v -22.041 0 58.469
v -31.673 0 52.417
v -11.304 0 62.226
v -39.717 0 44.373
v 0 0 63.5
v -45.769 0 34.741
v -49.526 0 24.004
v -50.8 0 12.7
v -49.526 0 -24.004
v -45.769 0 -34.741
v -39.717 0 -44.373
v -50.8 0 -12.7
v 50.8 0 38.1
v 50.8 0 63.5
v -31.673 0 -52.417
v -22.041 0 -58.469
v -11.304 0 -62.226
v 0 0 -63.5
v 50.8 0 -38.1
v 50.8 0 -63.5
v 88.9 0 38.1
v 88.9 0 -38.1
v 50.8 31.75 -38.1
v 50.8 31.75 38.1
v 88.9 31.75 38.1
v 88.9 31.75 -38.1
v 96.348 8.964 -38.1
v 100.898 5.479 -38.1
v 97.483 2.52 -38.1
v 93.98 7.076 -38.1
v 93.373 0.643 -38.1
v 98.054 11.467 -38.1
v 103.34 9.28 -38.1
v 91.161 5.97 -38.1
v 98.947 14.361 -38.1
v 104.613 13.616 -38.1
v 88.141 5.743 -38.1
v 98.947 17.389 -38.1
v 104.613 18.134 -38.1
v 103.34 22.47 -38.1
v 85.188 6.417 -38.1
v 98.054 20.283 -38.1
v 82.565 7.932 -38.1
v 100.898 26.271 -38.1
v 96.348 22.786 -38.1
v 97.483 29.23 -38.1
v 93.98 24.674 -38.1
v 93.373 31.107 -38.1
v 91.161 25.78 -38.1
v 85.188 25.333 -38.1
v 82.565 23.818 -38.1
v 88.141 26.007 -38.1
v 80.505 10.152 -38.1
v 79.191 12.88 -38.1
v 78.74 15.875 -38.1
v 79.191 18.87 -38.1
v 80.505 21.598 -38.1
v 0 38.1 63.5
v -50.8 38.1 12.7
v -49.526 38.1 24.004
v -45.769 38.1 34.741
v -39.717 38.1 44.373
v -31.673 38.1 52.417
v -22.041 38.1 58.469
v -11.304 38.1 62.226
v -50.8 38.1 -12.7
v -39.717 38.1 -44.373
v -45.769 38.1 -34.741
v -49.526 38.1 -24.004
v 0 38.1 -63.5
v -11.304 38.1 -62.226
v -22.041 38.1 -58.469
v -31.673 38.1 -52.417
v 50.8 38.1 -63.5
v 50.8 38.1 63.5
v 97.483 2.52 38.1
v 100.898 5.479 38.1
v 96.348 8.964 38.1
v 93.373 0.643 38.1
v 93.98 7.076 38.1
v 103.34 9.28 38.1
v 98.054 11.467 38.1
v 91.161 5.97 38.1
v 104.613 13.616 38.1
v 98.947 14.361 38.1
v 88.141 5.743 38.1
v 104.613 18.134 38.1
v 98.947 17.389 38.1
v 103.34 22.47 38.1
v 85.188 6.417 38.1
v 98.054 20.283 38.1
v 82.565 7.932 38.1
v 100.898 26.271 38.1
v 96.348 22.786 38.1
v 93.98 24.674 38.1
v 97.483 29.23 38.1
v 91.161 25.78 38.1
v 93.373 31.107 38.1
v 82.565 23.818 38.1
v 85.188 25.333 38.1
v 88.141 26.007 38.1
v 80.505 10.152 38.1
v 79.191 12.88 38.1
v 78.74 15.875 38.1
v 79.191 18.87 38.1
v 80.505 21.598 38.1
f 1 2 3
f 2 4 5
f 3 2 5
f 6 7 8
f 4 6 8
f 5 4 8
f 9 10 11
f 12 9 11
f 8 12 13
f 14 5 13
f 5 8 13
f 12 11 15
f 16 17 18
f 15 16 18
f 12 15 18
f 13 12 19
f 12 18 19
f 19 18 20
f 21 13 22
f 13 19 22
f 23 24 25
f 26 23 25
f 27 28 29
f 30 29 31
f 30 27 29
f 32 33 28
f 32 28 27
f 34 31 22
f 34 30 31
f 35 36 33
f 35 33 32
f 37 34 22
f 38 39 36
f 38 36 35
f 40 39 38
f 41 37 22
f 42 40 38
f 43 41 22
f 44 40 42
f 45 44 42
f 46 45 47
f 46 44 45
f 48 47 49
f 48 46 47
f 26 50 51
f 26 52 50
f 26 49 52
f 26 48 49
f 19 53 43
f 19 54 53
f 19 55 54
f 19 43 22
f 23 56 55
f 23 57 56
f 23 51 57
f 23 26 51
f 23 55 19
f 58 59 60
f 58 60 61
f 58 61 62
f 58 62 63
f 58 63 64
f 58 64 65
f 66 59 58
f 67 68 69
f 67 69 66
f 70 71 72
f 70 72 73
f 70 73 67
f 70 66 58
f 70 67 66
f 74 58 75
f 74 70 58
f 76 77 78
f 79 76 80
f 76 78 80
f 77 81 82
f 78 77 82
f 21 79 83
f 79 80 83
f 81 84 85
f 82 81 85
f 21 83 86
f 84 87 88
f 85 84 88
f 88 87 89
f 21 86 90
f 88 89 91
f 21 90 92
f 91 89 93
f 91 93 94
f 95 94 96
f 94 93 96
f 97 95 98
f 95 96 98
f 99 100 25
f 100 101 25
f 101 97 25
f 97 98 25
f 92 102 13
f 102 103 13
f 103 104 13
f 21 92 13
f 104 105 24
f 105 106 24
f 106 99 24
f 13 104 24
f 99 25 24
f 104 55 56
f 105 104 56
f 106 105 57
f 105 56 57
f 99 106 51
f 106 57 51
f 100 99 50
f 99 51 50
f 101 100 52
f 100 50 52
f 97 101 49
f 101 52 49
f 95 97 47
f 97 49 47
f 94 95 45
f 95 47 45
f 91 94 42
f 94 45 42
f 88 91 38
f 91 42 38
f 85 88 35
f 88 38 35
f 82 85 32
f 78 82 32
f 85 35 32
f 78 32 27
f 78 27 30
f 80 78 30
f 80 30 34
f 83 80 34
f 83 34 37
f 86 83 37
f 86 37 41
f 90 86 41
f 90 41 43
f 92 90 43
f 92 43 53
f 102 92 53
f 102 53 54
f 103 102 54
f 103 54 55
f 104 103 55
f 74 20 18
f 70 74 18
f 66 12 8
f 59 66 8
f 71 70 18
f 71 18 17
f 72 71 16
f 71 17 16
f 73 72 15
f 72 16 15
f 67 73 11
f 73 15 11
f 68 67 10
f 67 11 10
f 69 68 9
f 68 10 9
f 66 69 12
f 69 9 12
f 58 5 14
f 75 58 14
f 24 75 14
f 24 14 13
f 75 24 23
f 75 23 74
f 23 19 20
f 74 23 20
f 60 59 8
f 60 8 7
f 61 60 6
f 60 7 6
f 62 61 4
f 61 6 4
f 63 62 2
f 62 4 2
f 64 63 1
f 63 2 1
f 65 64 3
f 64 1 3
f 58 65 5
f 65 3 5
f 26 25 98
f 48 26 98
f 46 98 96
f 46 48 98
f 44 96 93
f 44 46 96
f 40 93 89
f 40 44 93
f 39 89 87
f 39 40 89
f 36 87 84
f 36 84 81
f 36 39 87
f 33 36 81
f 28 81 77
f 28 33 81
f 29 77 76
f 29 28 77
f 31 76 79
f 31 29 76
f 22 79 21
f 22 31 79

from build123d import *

# Parameters (mm, degrees)
BOSS_EXTRUDE1_DEPTH      = 38.1
BOSS_EXTRUDE2_DEPTH      = 38.1
BOSS_EXTRUDE2_DEPTH_BACK = 38.1
SKETCH3_R                = 10.16
CUT_EXTRUDE1_DEPTH       = 151.837563707


with BuildPart() as part:
    # Sketch1 → Boss-Extrude1 (new body)
    with BuildSketch(Plane(origin=(0, 0, 0), x_dir=(1, 0, 0), z_dir=(0, 1, 0))):
        with BuildLine():
            Line((50.8, 63.5), (0, 63.5))
            ThreePointArc((0, 63.5), (-35.921024484, 48.621024484), (-50.8, 12.7))
            Line((-50.8, 12.7), (-50.8, -12.7))
            ThreePointArc((-50.8, -12.7), (-35.921024484, -48.621024484), (0, -63.5))
            Line((0, -63.5), (50.8, -63.5))
            Line((50.8, -63.5), (50.8, 63.5))
        make_face()
    extrude(amount=BOSS_EXTRUDE1_DEPTH)

    # Sketch2 → Boss-Extrude2 (add, two sides: drawn at the far end of the back side and taken through both)
    with BuildSketch(Plane.XY.offset(-BOSS_EXTRUDE2_DEPTH_BACK)):
        with BuildLine():
            Line((50.8, 31.75), (88.9, 31.75))
            ThreePointArc((88.9, 31.75), (104.775, 15.875), (88.9, 0))
            Line((88.9, 0), (50.8, 0))
            Line((50.8, 0), (50.8, 31.75))
        make_face()
    extrude(amount=BOSS_EXTRUDE2_DEPTH + BOSS_EXTRUDE2_DEPTH_BACK)

    # Sketch3 → Cut-Extrude1 (cut, through all)
    with BuildSketch(Plane(origin=(0, 0, -38.1), x_dir=(-1, 0, 0), z_dir=(0, 0, -1))):
        with Locations((-88.9, 15.875)):
            Circle(SKETCH3_R)
    extrude(amount=-CUT_EXTRUDE1_DEPTH, mode=Mode.SUBTRACT)


solid = part.part
